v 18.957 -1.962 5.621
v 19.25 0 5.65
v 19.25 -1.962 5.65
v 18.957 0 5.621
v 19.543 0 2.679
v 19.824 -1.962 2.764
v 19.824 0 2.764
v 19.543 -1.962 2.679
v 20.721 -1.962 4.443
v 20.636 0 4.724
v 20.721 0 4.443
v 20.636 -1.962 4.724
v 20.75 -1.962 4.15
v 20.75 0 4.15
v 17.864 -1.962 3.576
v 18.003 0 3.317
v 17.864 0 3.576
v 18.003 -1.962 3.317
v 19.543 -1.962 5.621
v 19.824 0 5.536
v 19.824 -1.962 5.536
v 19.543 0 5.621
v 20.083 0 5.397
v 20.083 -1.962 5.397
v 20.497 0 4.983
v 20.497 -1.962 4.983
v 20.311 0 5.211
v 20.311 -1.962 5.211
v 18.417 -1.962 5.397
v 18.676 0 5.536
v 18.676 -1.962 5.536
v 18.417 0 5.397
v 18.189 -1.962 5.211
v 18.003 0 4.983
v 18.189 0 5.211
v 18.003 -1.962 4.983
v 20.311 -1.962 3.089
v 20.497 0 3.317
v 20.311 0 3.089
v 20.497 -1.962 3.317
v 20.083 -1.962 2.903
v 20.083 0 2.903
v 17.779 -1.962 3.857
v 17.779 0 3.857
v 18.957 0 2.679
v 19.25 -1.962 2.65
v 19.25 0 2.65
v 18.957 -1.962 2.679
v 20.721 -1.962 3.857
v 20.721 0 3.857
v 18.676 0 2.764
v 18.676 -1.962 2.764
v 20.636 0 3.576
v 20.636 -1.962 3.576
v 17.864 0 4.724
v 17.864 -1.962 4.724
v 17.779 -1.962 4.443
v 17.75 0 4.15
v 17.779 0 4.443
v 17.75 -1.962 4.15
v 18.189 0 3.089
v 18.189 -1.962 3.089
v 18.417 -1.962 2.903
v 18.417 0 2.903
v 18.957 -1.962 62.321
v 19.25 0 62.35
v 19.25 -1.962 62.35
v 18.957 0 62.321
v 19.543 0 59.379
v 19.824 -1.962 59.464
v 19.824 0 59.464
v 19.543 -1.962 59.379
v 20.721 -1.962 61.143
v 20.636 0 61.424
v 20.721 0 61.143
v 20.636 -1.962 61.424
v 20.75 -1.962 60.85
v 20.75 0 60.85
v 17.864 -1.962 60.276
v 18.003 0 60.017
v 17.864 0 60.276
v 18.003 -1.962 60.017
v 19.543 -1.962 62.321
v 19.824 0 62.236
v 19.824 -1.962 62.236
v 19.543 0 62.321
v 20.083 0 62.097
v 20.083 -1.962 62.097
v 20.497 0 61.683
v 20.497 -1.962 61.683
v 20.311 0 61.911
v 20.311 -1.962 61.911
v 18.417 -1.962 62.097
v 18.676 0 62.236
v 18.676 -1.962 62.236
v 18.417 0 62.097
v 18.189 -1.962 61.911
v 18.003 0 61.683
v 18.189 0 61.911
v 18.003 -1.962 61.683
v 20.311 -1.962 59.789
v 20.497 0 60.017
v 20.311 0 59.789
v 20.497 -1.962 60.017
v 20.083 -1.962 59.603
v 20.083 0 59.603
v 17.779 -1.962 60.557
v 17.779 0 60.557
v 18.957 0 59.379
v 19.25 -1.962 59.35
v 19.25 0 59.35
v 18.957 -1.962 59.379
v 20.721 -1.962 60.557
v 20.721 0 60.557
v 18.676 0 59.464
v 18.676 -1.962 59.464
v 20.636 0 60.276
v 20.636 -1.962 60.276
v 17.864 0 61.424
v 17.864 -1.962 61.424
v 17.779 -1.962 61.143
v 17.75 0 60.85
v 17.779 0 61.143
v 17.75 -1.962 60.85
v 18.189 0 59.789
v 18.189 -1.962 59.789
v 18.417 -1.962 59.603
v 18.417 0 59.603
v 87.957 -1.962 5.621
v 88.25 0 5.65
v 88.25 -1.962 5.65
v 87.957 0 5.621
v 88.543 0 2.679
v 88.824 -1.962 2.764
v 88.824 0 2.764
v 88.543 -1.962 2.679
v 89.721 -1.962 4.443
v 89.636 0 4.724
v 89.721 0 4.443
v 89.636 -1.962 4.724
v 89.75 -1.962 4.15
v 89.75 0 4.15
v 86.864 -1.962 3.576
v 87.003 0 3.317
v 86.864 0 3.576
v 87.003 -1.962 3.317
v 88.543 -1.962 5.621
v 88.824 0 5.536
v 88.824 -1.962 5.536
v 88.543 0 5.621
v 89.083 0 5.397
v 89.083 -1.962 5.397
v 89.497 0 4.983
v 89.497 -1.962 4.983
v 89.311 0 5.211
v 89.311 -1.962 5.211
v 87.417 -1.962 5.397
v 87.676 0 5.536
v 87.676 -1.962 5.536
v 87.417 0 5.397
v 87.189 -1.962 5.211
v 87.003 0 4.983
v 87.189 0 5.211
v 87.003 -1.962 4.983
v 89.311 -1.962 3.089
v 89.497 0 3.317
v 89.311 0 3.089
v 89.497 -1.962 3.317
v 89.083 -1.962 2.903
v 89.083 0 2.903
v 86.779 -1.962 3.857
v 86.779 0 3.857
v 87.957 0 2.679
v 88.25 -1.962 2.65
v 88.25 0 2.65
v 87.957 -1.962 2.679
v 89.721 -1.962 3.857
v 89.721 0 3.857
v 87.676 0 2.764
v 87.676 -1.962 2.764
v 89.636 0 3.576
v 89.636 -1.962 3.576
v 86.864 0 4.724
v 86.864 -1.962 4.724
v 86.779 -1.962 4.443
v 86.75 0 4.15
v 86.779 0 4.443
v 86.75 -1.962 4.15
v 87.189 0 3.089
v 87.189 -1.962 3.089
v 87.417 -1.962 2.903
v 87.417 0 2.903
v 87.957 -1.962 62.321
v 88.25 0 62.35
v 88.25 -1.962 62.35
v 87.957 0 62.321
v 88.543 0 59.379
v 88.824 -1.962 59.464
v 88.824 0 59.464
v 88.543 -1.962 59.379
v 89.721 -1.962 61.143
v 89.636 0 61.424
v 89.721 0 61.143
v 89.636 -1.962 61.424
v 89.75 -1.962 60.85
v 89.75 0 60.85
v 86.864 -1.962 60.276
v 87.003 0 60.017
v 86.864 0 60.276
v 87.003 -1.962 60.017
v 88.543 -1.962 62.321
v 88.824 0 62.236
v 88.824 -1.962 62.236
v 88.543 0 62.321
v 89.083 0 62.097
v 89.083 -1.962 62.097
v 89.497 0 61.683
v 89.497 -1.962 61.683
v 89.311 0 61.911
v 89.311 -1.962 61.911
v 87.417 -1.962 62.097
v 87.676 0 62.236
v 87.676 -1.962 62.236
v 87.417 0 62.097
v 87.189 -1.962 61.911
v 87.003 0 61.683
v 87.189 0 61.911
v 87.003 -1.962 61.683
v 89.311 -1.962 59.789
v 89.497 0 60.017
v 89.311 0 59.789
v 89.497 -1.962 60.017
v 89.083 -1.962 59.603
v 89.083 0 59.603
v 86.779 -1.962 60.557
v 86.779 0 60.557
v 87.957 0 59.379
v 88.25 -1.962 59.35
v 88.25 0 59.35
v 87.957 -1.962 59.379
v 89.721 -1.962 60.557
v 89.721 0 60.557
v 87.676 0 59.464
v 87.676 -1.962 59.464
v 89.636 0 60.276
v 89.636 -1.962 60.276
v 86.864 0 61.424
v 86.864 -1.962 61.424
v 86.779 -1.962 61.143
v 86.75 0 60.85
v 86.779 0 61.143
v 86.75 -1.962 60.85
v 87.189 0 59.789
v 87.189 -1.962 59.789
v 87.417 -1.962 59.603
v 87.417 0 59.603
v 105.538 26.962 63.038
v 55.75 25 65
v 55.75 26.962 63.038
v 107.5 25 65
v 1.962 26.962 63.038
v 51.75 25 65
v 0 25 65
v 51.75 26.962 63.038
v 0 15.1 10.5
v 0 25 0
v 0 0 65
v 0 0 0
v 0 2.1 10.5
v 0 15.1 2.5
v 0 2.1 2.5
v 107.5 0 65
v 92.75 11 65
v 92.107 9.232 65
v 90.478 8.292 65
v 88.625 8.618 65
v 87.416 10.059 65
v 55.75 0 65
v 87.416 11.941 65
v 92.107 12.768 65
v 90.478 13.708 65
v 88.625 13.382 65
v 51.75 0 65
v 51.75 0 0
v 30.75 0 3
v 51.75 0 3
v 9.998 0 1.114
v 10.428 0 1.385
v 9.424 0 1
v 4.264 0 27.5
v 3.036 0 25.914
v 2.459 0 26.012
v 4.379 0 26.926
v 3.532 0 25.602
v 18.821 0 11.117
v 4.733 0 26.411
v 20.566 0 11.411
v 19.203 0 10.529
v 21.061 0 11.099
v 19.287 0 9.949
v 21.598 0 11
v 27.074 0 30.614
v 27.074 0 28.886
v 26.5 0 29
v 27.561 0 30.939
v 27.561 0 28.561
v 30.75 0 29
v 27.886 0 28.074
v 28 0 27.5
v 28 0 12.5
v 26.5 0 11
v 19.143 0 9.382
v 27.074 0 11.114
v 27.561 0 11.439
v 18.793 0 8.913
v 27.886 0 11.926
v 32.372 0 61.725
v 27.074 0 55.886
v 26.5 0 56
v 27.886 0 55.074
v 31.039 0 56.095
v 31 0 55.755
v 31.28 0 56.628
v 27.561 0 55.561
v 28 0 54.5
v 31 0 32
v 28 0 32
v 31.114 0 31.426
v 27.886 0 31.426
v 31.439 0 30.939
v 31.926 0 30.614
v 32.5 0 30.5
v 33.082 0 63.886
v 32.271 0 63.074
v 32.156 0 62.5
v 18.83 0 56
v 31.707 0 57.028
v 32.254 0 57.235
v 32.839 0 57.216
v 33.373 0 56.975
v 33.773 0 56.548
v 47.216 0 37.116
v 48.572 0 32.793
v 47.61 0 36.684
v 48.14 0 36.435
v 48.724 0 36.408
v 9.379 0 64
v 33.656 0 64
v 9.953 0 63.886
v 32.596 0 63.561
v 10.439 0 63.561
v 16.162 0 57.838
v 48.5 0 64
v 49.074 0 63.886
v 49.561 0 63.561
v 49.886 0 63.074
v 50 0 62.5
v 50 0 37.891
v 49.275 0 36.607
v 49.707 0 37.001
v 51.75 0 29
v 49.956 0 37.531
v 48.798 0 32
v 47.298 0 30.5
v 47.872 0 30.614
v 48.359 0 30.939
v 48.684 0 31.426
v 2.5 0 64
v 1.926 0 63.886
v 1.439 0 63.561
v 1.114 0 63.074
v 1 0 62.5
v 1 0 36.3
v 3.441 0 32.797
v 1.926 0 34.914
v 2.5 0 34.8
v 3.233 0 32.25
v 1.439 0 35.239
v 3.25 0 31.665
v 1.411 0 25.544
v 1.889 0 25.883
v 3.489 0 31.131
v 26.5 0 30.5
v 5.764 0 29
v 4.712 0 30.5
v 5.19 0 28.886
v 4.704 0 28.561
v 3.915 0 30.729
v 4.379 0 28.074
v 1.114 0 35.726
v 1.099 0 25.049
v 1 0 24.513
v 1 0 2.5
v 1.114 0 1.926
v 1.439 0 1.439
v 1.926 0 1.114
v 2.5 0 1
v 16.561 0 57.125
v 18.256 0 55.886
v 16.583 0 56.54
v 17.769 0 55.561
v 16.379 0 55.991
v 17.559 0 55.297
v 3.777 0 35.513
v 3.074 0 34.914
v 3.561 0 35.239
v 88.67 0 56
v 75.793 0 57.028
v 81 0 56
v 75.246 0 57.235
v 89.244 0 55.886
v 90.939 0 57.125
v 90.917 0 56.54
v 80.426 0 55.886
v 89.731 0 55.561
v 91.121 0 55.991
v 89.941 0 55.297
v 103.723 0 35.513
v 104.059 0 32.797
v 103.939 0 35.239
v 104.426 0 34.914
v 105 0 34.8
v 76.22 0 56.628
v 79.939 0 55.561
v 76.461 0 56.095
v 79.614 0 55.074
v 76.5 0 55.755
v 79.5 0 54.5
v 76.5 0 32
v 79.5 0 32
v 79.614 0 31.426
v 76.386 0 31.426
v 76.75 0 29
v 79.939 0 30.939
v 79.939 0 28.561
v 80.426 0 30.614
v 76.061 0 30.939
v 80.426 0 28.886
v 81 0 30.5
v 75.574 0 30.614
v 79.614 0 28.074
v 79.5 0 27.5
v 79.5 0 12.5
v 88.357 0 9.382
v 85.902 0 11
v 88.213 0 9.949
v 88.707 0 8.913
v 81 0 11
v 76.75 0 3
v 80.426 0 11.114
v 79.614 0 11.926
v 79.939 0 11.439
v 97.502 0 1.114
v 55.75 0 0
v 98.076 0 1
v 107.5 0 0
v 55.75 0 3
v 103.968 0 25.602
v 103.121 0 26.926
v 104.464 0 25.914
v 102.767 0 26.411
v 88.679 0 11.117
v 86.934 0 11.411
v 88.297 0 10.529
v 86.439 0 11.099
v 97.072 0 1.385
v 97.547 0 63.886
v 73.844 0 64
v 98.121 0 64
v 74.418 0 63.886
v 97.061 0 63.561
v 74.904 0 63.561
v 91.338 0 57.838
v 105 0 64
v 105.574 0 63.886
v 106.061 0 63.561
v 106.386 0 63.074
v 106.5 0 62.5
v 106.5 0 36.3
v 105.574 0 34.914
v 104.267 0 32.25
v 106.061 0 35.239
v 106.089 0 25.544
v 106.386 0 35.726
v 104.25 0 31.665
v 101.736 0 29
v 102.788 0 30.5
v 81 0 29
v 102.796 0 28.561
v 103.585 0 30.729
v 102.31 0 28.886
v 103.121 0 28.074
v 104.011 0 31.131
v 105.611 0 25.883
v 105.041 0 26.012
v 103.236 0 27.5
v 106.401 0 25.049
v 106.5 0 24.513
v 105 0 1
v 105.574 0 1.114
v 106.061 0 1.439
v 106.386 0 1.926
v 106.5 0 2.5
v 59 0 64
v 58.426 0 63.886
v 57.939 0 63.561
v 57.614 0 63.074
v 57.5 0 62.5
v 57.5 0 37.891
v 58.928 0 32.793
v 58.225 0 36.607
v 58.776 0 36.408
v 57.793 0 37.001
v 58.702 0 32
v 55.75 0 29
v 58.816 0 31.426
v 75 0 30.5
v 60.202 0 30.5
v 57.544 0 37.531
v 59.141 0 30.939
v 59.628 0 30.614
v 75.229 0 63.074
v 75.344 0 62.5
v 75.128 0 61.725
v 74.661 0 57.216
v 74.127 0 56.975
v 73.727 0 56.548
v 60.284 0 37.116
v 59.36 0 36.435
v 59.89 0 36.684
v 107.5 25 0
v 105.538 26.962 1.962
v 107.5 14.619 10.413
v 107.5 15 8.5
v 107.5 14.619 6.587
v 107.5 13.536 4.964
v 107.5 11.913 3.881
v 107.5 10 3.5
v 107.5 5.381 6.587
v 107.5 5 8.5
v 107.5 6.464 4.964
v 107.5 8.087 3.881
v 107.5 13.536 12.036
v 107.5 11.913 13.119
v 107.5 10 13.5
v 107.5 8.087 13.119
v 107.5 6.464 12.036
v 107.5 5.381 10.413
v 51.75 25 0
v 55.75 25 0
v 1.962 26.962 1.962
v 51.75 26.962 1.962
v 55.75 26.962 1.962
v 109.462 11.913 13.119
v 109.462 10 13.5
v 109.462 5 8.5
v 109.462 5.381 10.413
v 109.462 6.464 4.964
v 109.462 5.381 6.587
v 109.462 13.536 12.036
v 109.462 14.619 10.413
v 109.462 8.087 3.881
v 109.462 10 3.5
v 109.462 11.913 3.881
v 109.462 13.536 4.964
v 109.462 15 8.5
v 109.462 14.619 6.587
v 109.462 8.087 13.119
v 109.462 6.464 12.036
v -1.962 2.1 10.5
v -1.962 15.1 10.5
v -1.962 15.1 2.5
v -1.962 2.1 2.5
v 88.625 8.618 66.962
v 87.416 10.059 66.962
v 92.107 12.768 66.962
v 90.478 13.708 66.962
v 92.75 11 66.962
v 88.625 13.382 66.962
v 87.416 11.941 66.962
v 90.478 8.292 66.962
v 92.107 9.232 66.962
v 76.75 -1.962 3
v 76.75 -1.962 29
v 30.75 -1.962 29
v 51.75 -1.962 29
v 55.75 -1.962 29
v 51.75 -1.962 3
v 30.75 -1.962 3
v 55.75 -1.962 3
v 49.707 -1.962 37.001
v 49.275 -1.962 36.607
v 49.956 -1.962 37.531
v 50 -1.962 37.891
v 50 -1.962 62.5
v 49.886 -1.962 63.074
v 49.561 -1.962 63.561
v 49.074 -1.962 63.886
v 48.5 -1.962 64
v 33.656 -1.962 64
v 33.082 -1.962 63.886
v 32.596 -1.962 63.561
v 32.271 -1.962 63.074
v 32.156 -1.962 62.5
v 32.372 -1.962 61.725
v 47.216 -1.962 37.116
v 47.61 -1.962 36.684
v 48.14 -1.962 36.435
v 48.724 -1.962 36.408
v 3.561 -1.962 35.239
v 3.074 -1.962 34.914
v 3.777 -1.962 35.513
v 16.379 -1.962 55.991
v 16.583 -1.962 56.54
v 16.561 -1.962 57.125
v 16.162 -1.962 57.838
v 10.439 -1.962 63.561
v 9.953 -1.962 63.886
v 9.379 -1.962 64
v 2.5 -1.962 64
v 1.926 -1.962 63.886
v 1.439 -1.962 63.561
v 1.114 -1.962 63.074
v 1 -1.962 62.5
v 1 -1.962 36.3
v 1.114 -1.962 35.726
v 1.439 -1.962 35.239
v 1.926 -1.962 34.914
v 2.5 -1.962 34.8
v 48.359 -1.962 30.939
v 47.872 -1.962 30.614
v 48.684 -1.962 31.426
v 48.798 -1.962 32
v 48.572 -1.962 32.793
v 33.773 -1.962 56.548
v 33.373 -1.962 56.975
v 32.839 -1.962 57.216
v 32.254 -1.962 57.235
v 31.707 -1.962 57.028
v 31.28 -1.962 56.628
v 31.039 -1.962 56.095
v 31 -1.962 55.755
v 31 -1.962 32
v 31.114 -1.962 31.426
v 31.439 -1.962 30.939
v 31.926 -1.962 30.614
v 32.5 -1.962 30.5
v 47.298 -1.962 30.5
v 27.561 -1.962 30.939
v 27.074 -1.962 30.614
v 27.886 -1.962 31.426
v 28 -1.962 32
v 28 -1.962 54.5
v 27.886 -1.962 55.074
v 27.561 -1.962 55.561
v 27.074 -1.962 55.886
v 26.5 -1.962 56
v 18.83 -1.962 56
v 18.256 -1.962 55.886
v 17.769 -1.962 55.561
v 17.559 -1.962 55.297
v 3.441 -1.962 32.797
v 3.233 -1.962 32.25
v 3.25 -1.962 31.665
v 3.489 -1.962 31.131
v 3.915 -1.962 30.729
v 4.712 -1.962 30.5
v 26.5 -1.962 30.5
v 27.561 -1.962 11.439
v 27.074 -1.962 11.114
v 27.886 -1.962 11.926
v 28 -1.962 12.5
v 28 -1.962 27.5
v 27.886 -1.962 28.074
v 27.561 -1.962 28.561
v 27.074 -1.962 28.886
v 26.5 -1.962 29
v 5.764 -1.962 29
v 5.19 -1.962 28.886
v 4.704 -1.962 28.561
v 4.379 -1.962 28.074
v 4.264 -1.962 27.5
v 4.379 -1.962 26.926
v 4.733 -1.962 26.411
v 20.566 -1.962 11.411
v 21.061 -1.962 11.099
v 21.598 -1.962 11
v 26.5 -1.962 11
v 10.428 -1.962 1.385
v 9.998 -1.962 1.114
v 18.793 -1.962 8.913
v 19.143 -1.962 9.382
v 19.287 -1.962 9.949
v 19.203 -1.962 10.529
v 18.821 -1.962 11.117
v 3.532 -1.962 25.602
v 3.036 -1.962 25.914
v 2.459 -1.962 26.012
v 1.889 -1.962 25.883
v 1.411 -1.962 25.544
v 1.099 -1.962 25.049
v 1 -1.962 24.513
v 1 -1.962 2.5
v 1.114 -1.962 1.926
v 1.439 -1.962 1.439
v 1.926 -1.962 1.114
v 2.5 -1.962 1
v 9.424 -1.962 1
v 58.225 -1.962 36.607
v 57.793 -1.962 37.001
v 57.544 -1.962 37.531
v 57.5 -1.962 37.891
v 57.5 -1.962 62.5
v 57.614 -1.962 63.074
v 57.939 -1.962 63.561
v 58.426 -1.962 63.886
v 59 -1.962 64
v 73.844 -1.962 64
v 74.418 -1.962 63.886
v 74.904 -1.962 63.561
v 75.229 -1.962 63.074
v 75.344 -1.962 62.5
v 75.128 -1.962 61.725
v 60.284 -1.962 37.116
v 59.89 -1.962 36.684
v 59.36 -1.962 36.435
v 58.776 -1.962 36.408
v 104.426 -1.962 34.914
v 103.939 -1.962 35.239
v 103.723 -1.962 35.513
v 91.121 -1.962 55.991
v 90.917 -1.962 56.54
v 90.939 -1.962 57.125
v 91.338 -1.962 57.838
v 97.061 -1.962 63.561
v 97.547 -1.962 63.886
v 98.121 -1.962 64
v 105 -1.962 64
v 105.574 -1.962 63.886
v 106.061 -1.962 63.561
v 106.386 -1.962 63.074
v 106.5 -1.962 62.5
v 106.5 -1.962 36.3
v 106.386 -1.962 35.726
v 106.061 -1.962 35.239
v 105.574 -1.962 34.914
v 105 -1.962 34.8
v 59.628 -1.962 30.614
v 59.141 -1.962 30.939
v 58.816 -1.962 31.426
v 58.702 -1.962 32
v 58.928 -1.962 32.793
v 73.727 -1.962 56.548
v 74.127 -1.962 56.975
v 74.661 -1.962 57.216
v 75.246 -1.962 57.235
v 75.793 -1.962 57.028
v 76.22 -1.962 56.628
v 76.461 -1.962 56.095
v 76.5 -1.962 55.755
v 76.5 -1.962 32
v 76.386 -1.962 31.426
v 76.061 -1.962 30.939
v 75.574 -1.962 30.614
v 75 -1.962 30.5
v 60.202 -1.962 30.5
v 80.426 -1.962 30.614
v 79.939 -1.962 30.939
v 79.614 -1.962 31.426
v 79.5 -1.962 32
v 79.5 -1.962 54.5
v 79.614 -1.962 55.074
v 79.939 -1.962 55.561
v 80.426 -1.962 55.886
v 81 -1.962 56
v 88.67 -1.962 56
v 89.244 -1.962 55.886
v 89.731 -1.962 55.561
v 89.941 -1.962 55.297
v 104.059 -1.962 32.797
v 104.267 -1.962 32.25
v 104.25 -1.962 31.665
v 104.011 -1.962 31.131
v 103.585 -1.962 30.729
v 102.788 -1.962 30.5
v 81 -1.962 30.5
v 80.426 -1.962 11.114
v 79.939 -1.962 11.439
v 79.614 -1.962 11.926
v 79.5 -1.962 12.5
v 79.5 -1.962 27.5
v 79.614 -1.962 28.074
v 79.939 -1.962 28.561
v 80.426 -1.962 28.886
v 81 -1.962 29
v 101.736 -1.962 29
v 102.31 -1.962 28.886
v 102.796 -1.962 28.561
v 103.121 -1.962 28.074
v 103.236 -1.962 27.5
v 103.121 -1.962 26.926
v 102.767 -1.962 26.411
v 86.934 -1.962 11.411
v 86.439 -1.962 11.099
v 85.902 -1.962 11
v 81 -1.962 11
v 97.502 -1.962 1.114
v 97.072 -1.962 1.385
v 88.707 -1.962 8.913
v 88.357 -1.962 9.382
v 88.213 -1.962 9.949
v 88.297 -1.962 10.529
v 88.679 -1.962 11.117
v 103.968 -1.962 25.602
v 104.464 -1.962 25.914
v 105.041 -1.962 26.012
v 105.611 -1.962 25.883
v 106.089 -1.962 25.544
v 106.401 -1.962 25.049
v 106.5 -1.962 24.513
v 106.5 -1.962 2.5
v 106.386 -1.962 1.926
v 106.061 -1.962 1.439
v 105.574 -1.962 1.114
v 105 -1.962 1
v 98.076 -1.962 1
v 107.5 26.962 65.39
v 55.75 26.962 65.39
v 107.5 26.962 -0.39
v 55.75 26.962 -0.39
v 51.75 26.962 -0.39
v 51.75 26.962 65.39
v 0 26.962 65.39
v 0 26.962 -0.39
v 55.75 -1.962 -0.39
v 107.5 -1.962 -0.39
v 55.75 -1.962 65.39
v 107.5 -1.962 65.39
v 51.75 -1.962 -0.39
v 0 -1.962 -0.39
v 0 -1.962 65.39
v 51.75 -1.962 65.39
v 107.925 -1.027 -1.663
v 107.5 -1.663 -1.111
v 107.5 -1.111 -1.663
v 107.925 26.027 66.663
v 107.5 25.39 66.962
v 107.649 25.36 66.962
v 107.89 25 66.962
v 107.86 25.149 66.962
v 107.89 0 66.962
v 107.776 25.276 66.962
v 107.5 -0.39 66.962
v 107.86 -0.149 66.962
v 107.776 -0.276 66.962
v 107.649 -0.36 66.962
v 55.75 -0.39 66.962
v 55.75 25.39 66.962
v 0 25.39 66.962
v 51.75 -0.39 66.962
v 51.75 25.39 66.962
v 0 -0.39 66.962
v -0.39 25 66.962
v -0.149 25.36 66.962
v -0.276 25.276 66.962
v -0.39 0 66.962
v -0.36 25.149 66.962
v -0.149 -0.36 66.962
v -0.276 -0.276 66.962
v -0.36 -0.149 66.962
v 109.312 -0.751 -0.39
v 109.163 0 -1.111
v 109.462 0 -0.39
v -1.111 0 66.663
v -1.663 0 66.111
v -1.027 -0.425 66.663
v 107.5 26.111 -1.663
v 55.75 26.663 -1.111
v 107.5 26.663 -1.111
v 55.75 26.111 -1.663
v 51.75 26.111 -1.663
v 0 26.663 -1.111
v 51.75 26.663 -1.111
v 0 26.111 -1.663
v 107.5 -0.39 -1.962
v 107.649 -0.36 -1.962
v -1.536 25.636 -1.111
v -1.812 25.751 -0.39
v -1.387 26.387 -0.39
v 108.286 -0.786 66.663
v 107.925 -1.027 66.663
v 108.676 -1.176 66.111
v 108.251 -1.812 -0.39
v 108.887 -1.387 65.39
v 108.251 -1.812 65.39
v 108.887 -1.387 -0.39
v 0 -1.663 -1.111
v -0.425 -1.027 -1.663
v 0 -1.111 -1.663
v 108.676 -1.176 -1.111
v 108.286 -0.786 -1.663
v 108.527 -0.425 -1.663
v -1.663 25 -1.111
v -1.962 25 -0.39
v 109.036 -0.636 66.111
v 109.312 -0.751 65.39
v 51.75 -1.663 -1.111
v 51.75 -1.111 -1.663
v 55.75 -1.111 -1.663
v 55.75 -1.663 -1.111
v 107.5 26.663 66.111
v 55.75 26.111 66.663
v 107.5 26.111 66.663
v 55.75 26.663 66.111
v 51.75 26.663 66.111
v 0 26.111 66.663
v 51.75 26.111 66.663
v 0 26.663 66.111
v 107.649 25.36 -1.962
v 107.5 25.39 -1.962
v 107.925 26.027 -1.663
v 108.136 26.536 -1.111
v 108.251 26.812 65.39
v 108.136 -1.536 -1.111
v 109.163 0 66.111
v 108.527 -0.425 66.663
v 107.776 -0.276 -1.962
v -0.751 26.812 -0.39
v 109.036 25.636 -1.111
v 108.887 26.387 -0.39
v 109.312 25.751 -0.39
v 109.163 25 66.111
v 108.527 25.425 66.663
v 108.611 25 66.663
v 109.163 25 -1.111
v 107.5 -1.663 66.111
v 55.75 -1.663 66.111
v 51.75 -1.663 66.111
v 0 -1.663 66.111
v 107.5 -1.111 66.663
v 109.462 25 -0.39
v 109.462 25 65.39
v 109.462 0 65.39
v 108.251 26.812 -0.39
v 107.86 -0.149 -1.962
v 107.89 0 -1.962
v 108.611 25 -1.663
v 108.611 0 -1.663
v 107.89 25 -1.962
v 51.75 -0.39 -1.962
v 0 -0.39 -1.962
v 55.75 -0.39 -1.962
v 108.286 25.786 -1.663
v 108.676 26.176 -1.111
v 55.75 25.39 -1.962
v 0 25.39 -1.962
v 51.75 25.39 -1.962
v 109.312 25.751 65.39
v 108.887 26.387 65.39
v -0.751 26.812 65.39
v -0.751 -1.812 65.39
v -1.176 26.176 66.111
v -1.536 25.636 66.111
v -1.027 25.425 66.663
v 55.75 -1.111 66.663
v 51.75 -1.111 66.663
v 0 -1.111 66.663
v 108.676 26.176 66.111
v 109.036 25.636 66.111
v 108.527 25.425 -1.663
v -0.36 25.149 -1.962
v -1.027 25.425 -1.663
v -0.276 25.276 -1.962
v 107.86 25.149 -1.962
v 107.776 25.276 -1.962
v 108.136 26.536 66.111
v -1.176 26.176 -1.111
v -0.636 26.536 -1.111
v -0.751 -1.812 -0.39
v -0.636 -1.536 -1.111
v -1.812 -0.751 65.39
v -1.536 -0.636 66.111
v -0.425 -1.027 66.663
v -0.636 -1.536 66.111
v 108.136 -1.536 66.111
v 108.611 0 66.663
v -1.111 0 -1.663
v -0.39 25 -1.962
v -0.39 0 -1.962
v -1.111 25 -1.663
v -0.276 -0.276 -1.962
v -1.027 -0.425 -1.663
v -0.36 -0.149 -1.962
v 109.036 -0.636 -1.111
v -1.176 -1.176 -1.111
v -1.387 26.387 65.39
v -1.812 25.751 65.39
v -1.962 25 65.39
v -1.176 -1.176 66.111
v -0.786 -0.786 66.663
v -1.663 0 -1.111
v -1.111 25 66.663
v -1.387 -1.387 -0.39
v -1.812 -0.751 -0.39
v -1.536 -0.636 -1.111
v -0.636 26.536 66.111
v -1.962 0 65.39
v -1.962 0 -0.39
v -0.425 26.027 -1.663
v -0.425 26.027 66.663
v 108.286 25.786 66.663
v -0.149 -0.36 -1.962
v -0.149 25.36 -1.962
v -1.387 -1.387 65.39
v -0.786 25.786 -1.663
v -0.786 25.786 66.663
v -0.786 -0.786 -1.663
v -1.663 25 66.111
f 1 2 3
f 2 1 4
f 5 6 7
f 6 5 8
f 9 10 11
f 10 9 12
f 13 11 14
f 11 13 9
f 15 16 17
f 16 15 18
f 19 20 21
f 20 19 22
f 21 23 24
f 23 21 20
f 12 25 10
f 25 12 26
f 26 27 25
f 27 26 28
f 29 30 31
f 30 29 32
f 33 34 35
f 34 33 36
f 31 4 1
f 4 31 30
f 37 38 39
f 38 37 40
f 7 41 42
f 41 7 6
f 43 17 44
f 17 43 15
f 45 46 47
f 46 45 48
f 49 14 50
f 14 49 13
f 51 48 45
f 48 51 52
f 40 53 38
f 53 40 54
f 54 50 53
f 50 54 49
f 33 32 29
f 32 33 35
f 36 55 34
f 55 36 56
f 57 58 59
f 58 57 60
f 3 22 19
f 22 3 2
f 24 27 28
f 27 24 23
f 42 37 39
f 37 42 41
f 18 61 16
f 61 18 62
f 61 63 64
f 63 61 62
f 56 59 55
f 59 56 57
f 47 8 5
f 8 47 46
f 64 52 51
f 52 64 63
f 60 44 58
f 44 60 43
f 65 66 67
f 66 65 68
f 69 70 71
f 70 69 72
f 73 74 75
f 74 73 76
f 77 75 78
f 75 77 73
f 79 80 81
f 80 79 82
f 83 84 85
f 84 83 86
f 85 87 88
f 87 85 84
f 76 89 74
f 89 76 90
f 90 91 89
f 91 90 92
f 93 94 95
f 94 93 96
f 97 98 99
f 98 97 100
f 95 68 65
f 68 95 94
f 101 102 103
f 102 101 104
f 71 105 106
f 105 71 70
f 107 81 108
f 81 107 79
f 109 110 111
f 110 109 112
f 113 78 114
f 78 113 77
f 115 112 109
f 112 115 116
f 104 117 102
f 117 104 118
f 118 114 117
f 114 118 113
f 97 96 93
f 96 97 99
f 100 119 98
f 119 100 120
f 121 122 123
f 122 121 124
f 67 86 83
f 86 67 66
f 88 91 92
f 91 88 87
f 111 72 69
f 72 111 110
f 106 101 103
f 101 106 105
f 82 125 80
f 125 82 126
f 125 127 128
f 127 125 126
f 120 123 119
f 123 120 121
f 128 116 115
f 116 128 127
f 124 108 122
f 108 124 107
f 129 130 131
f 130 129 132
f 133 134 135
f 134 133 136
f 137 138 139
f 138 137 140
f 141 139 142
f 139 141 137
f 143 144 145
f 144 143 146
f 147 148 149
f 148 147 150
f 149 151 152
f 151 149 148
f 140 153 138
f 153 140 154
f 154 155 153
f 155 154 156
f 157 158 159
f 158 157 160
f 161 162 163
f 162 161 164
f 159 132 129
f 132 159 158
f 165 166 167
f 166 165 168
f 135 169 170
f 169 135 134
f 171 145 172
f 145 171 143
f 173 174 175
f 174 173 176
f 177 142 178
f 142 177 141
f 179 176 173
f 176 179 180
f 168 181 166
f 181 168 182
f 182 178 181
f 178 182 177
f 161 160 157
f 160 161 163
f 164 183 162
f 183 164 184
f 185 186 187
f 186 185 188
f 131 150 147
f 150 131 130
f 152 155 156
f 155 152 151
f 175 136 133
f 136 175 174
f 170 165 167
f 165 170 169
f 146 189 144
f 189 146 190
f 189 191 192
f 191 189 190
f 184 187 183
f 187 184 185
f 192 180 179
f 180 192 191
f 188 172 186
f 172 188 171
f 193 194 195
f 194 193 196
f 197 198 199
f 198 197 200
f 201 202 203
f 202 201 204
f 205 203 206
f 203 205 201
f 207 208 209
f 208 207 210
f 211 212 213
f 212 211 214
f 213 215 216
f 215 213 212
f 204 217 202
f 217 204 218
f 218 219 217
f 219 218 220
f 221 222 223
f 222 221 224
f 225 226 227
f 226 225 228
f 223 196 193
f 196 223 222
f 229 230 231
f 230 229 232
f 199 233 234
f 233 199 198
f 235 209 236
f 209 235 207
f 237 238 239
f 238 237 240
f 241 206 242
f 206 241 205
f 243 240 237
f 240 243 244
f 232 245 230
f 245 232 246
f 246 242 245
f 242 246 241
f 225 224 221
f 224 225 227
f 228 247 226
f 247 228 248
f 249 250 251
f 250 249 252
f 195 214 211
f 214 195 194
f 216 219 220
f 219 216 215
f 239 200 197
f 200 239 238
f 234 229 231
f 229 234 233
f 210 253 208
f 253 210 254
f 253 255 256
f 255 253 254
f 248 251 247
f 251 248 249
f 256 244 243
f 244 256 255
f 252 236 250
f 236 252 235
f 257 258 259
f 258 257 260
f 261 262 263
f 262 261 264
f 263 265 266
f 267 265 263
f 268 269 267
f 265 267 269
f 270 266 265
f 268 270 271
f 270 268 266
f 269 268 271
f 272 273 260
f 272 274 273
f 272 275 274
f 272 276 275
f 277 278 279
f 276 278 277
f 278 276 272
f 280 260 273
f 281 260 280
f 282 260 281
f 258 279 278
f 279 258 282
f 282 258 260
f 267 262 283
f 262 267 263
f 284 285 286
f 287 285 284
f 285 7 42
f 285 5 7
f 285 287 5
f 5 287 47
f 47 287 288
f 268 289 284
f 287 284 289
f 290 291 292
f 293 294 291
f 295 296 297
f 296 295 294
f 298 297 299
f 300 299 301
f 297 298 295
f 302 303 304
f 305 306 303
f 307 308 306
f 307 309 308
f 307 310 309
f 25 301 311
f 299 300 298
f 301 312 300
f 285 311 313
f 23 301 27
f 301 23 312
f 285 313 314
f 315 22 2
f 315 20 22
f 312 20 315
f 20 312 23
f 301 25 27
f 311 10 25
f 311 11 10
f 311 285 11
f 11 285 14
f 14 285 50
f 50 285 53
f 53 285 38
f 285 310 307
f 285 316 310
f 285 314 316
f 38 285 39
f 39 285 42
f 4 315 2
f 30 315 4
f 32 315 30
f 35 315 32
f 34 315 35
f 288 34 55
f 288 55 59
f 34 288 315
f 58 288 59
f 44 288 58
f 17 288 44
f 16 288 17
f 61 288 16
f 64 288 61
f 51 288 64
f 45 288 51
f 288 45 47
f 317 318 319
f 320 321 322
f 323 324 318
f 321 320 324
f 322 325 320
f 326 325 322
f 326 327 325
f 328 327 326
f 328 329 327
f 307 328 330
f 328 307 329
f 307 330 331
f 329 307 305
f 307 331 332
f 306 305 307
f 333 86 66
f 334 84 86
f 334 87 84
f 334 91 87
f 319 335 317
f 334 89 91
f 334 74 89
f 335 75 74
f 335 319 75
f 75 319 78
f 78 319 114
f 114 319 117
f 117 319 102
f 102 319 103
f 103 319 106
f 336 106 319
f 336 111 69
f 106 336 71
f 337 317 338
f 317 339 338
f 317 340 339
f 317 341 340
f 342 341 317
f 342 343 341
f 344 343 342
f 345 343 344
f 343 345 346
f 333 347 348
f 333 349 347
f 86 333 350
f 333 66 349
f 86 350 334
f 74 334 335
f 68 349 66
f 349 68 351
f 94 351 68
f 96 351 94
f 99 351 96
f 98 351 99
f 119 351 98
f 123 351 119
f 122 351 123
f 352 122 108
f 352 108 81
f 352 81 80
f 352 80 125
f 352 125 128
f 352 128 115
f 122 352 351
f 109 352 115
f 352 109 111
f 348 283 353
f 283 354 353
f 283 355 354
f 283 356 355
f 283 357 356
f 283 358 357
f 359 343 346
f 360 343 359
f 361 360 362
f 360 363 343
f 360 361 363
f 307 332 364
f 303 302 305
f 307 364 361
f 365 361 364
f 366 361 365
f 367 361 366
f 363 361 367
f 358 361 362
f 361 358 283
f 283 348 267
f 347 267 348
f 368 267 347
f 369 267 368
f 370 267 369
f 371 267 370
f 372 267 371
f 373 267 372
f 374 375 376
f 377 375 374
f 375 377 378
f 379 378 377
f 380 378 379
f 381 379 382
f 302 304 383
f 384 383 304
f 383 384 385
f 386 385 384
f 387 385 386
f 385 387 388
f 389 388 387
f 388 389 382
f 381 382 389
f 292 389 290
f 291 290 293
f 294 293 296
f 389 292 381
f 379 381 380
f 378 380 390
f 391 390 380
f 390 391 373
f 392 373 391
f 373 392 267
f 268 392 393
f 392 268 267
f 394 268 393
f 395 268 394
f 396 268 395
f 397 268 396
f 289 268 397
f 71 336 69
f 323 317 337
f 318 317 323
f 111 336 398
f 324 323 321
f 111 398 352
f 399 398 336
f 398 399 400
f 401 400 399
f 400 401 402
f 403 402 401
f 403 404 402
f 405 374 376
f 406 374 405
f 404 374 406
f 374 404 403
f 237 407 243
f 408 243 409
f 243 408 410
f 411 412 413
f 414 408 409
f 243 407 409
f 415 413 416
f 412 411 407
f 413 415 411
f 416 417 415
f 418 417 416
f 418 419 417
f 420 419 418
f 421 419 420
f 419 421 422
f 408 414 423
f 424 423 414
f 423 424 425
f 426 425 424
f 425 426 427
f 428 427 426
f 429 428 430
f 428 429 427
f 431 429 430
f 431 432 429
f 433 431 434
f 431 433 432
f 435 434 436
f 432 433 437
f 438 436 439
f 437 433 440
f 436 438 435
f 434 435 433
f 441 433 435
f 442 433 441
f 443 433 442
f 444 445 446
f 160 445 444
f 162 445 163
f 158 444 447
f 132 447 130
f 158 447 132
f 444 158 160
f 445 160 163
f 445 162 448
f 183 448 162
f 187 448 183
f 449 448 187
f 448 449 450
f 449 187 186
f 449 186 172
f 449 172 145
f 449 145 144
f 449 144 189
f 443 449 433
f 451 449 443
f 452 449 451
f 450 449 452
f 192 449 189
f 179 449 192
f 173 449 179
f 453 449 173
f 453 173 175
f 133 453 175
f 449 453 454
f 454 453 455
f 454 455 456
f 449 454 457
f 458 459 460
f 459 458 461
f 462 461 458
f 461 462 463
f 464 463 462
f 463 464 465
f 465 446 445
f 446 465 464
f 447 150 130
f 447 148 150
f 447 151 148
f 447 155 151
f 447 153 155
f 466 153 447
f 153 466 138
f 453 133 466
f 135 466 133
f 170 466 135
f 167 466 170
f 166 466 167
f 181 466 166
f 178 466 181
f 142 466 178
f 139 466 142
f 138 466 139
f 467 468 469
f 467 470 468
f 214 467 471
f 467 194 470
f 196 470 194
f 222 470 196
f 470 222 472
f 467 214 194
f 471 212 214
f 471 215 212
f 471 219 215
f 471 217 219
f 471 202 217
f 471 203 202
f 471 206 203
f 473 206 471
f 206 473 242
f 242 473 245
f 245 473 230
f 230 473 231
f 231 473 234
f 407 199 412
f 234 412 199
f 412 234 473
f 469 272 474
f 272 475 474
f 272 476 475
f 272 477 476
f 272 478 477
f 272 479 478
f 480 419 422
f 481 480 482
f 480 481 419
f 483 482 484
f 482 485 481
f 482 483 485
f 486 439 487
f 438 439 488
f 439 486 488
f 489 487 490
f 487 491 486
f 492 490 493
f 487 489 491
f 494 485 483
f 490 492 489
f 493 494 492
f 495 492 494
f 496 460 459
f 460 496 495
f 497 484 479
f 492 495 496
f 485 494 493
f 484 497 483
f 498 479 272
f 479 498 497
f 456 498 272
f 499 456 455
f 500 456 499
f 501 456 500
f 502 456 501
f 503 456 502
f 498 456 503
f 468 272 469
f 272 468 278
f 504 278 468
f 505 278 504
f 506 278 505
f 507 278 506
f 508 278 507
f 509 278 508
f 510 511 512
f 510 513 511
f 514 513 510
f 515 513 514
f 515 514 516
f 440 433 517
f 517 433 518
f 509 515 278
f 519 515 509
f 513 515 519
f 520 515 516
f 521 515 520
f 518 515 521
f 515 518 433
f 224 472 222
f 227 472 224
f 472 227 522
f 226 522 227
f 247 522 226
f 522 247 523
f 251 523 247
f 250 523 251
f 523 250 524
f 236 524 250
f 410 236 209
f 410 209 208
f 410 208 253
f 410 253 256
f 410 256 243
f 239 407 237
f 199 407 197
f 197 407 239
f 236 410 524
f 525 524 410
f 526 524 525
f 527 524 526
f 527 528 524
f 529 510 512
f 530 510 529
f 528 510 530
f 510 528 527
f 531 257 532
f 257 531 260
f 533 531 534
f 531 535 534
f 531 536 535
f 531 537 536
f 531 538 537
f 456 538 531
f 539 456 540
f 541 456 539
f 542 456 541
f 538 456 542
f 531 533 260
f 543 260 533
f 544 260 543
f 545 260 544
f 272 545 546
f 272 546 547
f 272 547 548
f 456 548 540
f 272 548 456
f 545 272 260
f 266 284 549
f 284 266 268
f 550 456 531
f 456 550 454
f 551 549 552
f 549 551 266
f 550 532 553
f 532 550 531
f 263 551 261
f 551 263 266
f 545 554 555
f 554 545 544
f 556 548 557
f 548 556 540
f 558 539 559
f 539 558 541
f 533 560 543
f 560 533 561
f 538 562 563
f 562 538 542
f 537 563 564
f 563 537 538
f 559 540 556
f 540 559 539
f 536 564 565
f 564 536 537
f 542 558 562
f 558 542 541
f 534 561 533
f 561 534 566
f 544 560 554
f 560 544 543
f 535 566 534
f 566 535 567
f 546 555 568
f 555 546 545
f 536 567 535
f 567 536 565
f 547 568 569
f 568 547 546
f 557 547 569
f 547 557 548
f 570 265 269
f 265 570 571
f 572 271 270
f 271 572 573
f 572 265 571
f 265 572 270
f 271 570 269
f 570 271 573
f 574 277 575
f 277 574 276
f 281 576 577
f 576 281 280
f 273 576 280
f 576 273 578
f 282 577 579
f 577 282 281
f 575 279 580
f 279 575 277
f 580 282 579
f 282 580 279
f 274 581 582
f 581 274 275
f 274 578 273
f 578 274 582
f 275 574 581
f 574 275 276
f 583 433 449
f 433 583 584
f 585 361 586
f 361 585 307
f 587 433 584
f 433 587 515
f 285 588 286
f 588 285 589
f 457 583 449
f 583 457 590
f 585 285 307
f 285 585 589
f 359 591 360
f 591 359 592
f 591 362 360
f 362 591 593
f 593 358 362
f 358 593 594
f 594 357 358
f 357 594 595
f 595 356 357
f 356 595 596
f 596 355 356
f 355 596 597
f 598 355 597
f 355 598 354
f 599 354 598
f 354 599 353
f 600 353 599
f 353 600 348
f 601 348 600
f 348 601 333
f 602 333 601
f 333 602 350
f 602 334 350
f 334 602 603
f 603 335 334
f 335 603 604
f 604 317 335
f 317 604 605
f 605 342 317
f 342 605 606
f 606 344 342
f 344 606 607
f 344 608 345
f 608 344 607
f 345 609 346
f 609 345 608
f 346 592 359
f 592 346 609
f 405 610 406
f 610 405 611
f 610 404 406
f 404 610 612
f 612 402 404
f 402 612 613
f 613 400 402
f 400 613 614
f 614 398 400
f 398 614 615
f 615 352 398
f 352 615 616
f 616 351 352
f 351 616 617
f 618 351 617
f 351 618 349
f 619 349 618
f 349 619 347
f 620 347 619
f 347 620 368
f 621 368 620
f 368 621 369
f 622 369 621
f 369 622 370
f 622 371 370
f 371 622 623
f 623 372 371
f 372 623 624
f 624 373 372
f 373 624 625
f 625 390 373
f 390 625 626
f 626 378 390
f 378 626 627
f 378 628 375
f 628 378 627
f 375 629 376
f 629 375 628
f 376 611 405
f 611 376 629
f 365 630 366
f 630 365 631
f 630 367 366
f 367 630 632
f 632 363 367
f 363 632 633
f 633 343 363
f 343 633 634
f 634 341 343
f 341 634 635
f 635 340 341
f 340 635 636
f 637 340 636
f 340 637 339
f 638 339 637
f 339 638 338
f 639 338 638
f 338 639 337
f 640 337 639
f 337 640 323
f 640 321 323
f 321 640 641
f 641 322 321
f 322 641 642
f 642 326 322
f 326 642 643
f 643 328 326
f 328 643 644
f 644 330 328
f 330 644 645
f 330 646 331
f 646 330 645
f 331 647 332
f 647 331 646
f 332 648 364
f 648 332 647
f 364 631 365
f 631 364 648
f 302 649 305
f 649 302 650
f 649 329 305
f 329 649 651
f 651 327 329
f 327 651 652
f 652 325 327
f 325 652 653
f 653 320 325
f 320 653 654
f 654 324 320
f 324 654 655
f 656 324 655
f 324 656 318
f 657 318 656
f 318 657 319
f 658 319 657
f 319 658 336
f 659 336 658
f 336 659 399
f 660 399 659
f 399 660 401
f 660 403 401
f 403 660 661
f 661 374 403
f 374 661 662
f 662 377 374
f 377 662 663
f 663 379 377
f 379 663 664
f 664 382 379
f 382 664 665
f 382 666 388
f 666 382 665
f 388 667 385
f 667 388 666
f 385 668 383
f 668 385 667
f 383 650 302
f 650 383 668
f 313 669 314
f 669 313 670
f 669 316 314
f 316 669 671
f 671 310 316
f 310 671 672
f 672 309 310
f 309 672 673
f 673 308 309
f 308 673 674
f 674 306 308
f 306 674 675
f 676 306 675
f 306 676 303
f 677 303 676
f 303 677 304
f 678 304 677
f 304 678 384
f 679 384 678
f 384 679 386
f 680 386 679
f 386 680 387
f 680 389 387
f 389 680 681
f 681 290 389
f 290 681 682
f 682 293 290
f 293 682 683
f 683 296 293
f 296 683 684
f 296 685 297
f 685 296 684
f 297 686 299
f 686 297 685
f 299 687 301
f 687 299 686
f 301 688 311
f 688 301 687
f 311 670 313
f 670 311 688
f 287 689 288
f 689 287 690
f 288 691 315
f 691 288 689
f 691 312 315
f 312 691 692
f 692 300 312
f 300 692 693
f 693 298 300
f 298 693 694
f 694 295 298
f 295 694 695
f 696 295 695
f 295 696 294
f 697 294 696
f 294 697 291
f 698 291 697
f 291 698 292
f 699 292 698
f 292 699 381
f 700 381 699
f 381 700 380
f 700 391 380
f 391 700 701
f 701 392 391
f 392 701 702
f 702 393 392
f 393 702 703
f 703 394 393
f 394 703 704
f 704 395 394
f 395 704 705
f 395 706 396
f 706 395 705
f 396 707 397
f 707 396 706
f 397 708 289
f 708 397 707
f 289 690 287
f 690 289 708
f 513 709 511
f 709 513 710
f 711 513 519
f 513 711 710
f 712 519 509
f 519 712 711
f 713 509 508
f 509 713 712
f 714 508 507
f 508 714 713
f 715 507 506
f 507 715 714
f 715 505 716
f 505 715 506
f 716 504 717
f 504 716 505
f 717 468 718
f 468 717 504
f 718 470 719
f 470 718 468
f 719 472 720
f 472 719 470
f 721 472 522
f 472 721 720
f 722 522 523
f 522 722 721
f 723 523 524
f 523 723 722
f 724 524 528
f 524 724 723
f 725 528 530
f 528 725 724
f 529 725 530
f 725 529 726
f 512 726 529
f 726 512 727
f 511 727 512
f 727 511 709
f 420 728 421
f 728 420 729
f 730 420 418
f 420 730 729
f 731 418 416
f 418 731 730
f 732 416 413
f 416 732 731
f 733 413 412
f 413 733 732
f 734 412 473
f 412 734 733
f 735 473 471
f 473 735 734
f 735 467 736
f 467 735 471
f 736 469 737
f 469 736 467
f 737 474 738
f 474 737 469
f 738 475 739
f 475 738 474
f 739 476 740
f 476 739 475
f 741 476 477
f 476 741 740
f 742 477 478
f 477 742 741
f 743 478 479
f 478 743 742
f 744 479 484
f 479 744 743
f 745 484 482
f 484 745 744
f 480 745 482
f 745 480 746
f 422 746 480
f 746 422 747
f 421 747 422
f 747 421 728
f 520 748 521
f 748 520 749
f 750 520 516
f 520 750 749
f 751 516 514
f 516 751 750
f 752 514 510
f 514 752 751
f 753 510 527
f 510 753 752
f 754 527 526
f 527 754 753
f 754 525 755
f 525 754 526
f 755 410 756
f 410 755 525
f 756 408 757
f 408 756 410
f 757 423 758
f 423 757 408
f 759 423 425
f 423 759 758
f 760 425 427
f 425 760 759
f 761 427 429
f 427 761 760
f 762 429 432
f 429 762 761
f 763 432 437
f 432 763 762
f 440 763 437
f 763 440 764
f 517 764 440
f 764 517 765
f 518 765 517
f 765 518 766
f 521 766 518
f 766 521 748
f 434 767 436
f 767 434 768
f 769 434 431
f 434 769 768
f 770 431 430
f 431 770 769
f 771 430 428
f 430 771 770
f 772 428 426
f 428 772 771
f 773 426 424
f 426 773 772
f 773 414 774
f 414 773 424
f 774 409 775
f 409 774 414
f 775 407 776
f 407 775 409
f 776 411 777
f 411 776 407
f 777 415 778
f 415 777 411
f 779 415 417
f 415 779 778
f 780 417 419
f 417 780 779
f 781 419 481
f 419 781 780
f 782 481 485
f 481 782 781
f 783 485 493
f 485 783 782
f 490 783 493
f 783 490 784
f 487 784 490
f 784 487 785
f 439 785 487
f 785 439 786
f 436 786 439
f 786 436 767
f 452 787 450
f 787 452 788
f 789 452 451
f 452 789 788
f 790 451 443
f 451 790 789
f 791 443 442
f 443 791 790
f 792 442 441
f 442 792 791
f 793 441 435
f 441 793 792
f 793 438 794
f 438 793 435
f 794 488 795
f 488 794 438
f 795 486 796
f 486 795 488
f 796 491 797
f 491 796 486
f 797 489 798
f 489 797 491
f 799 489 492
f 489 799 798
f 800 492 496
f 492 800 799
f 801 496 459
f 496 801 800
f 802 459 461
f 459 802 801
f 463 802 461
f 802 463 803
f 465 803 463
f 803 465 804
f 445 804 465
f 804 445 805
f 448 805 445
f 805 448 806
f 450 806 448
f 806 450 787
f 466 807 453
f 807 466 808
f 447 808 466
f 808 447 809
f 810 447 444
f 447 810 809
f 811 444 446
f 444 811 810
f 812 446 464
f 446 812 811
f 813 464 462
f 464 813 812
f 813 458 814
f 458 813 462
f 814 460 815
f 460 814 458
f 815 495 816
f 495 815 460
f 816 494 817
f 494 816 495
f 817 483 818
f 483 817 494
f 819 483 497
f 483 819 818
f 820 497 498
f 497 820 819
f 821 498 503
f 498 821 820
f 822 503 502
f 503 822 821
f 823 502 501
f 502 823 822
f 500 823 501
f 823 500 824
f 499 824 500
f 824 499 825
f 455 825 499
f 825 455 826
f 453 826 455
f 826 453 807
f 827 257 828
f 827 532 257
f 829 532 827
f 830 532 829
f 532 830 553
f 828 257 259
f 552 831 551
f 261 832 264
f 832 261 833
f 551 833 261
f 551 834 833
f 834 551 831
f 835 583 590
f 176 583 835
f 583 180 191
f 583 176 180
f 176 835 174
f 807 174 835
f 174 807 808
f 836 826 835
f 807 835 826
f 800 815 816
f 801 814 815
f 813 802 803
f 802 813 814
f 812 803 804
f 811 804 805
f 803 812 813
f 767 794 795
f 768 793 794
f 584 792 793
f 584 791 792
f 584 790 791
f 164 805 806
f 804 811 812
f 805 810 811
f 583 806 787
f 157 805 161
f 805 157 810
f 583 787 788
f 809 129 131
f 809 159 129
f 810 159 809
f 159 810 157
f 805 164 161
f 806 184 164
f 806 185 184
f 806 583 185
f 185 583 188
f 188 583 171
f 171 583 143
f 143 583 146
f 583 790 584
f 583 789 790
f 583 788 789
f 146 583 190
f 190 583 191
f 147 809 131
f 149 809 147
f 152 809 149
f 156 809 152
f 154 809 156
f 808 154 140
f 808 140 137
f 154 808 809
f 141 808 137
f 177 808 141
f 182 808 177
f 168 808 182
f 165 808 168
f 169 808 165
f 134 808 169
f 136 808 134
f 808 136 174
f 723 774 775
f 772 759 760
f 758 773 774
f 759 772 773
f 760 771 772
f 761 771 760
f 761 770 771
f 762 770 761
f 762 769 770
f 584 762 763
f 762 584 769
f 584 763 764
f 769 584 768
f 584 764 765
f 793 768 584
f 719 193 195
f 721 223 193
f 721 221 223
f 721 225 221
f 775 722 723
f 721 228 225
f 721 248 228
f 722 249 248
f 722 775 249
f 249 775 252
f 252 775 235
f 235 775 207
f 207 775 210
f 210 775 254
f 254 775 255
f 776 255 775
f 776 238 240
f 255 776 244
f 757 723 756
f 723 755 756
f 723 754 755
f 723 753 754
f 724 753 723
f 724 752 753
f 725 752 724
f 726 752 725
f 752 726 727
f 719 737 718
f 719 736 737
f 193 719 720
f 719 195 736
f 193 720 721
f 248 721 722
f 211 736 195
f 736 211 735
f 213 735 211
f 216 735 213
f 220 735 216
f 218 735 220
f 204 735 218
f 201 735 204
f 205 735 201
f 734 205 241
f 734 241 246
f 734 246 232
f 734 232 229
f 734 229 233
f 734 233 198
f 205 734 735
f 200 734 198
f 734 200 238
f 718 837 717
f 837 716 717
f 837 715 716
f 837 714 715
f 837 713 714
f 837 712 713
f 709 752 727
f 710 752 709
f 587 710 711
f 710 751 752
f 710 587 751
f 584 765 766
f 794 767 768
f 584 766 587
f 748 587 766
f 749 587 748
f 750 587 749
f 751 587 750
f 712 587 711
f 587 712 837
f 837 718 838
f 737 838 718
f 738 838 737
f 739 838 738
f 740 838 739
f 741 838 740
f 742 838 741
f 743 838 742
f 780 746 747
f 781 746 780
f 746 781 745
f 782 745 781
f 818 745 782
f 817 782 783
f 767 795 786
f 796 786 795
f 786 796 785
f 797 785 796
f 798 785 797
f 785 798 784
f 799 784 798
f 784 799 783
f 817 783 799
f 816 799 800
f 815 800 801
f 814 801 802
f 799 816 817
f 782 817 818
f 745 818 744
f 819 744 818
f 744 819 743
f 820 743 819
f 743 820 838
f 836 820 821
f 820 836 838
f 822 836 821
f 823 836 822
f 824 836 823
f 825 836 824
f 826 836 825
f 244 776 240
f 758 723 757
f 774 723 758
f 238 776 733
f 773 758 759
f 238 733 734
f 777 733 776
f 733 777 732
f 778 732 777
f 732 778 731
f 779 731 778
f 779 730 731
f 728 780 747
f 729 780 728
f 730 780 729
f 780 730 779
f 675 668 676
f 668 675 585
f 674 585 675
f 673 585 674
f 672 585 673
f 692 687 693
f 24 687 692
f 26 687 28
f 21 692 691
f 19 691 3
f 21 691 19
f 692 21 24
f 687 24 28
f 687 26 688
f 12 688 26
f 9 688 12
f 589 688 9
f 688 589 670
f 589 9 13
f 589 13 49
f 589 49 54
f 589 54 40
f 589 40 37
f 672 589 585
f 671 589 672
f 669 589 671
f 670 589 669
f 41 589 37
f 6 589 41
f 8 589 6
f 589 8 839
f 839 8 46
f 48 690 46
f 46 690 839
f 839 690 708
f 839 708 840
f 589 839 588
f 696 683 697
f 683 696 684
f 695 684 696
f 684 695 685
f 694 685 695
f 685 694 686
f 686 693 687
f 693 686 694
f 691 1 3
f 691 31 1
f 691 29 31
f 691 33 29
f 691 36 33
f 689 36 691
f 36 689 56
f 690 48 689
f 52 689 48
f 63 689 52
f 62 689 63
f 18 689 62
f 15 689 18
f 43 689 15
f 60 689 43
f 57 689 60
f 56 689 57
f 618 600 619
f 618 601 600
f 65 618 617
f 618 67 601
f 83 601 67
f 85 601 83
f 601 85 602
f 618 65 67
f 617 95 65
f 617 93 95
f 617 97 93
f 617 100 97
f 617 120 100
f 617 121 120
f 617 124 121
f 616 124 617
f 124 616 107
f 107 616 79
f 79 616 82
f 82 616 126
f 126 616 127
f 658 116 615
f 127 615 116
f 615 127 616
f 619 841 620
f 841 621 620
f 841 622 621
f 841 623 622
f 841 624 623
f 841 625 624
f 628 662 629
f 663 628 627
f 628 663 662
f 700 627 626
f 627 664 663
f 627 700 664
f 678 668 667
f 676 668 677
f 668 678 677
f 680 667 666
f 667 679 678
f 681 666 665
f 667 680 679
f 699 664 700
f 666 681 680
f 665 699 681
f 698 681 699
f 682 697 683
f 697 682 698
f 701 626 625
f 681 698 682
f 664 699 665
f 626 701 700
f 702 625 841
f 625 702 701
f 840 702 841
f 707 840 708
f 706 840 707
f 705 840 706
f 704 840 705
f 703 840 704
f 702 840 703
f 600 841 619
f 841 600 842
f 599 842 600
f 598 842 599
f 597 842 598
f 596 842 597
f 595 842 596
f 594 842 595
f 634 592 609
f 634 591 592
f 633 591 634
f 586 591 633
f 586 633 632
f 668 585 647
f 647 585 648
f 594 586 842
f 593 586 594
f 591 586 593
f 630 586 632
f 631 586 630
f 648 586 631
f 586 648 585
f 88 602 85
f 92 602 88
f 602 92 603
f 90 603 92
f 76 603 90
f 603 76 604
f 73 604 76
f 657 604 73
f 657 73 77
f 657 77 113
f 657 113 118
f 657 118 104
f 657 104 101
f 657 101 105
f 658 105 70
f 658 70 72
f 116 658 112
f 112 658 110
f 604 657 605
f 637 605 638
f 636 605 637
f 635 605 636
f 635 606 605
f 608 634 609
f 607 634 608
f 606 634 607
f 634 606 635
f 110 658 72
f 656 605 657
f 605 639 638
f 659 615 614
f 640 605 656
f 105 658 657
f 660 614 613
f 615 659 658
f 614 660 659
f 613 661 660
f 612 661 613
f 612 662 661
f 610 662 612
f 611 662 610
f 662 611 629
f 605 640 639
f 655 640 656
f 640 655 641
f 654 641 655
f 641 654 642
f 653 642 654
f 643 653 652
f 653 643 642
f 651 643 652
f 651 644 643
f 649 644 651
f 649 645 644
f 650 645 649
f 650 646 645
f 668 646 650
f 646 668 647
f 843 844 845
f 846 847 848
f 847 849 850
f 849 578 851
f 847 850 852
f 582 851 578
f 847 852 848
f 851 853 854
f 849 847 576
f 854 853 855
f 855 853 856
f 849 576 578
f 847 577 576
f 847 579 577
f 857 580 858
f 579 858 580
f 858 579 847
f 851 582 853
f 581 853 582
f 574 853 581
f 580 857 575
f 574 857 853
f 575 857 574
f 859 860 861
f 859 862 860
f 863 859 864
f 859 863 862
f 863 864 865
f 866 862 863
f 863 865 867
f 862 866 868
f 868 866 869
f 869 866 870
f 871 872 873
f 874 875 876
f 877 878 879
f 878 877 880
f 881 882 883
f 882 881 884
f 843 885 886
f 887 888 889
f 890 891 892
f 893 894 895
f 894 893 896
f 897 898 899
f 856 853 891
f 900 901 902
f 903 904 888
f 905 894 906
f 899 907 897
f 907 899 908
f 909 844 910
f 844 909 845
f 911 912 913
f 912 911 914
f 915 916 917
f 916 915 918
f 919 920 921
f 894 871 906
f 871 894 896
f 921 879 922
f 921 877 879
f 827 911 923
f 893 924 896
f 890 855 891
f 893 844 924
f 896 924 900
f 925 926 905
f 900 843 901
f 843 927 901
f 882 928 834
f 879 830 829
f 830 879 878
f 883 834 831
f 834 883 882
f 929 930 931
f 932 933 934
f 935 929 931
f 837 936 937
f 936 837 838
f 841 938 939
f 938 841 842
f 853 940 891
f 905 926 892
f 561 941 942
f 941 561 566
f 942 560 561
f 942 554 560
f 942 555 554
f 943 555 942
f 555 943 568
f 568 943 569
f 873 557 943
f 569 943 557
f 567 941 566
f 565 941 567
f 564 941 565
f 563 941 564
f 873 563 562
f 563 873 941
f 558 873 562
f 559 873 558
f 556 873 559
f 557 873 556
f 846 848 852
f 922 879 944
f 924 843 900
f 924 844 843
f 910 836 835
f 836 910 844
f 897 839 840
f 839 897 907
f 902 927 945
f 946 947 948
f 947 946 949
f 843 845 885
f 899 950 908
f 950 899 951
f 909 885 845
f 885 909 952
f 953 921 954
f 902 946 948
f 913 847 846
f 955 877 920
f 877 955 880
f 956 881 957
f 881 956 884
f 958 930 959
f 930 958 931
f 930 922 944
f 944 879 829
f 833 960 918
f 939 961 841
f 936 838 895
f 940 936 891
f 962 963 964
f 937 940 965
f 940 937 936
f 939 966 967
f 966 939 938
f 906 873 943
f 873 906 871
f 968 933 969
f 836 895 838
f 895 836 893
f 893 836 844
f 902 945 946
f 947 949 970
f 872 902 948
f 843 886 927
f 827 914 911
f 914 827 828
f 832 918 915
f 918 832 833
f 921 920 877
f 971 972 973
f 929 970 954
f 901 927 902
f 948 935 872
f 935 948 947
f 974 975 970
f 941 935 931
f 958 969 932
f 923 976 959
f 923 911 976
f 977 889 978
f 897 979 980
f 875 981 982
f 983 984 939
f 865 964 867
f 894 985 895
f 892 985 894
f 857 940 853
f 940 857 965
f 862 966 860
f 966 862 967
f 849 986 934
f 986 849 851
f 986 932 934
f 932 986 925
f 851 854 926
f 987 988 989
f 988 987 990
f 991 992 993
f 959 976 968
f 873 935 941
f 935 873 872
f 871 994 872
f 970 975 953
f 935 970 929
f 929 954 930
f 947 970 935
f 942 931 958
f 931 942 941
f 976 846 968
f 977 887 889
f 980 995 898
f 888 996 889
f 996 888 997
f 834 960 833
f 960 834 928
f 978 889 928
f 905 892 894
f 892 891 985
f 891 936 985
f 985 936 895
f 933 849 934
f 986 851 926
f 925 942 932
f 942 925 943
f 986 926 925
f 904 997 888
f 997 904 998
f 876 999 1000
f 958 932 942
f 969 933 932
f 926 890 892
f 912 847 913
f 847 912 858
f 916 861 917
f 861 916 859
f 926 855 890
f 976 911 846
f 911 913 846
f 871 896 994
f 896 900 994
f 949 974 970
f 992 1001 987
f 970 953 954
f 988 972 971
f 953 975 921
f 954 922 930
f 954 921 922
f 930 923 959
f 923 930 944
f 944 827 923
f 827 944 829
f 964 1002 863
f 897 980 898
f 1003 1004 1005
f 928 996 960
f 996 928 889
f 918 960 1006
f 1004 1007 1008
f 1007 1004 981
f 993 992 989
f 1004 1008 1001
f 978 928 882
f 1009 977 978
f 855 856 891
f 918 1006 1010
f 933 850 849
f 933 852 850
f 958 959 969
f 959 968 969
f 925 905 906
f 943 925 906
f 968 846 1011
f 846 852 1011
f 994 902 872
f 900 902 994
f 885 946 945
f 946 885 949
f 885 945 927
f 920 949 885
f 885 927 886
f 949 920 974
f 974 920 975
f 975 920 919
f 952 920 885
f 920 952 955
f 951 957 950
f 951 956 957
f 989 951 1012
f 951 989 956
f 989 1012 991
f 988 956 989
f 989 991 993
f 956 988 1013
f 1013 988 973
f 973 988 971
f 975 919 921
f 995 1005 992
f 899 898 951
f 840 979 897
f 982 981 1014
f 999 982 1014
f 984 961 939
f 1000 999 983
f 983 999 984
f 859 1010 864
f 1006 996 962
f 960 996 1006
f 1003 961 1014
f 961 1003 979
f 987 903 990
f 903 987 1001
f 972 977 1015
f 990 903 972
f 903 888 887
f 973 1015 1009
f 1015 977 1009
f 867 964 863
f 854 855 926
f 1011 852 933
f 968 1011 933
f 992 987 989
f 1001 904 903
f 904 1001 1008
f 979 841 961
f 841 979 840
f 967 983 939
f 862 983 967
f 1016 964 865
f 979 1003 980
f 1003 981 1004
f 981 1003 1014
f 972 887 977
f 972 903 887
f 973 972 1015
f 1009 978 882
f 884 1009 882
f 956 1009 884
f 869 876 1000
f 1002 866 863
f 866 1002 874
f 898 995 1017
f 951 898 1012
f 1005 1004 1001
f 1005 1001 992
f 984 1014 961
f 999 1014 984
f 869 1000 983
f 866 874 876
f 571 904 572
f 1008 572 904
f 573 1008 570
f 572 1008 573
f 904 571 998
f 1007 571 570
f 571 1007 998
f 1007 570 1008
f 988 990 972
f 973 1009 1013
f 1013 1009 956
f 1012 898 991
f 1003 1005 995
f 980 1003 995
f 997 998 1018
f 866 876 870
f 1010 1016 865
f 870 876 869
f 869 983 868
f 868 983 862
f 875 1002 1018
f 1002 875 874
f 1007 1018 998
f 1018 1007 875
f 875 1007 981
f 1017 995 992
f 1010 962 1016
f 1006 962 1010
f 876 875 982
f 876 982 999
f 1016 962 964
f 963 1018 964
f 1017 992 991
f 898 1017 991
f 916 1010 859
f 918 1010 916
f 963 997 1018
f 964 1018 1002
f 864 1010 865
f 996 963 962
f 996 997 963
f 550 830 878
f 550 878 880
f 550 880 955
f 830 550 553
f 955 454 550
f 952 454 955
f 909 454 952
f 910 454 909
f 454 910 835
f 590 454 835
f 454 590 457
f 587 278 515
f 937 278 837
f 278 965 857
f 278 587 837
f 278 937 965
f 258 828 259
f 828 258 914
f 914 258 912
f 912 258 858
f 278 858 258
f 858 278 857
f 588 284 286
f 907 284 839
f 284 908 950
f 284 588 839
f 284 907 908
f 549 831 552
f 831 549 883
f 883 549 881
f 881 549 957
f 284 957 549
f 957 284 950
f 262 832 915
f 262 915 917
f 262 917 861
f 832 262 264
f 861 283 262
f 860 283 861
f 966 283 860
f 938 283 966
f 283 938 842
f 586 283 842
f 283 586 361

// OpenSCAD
width = 107.5;
height = 65;
depth = 25;

bolt_x = 69;
bolt_z = 56.7;

module scope()
{
    hull() {
    // Scope PCB itself
    cube([width, depth, height]);
    // Make sure the front is clear
    translate([2,0,2])
        cube([width-4, depth+2, height-4]);
    }
    // Probe hole
    translate([width,10,8.5])
        rotate([0,90,0])
            cylinder(h=20,center=true,d=10);
    // Power supply hole
    translate([0,8.6,6.5]) 
        cube([20,13,8],center=true);
    // Test waveform probe
    translate([90,11,65]) 
        cylinder(h=20,d=5.5,center=true);
    // Mounting holes
    for(x=[0,bolt_x])
        for(z = [0,bolt_z])
            translate([(width - bolt_x)/2+x,0,(height - bolt_z)/2+z])
                rotate([90,0,0])
                cylinder(h=20, d=3, $fn=32, center=true);
    // Piggyback 9V battery
    translate([width/2, 1, 16]) {
        cube([46,16.5,26], center=true);
    }
}

module material_saver_half() {
    rotate([90,0,0])
    linear_extrude(20, center=true, convexity=10)
    {
        offset(r=1.5, $fn=16)
        offset(r=-1.5) /**/ {
            polygon([[1,1],
                     [10,1],
                     [20,10],
                     [1,28]]);
            
            polygon([[2,29],
                     [28,29],
                     [28,11],
                     [21,11]]);
            
            polygon([[1,64],
                     [10,64],
                     [17,57],
                     [1,31]]);
            
            polygon([[2,30.5],
                     [28,30.5],
                     [28,56],
                     [18,56]]);
            
            polygon([[31,30.5],
                     [50,30.5],
                     [31,61]]); 
            polygon([[50,32.5],
                    // [31,58.5],
                     [31,64],
                     [50,64]]);
        }
    }
}

module material_saver() {
    material_saver_half();
    translate([width,0,0])
    mirror([1,0,0])
        material_saver_half();
}


module housing() {
    difference(){
        hull() {
            for(x=[0,width])
                for(z = [0,height])
                    for(y=[0,depth])
                        translate([x,y,z])
                            sphere(2, $fn=16);                               
        }       
        scope();   
        material_saver();
        translate([width/2,0,0])
            cube([4,900,900],center=true);
    }
}

housing();
